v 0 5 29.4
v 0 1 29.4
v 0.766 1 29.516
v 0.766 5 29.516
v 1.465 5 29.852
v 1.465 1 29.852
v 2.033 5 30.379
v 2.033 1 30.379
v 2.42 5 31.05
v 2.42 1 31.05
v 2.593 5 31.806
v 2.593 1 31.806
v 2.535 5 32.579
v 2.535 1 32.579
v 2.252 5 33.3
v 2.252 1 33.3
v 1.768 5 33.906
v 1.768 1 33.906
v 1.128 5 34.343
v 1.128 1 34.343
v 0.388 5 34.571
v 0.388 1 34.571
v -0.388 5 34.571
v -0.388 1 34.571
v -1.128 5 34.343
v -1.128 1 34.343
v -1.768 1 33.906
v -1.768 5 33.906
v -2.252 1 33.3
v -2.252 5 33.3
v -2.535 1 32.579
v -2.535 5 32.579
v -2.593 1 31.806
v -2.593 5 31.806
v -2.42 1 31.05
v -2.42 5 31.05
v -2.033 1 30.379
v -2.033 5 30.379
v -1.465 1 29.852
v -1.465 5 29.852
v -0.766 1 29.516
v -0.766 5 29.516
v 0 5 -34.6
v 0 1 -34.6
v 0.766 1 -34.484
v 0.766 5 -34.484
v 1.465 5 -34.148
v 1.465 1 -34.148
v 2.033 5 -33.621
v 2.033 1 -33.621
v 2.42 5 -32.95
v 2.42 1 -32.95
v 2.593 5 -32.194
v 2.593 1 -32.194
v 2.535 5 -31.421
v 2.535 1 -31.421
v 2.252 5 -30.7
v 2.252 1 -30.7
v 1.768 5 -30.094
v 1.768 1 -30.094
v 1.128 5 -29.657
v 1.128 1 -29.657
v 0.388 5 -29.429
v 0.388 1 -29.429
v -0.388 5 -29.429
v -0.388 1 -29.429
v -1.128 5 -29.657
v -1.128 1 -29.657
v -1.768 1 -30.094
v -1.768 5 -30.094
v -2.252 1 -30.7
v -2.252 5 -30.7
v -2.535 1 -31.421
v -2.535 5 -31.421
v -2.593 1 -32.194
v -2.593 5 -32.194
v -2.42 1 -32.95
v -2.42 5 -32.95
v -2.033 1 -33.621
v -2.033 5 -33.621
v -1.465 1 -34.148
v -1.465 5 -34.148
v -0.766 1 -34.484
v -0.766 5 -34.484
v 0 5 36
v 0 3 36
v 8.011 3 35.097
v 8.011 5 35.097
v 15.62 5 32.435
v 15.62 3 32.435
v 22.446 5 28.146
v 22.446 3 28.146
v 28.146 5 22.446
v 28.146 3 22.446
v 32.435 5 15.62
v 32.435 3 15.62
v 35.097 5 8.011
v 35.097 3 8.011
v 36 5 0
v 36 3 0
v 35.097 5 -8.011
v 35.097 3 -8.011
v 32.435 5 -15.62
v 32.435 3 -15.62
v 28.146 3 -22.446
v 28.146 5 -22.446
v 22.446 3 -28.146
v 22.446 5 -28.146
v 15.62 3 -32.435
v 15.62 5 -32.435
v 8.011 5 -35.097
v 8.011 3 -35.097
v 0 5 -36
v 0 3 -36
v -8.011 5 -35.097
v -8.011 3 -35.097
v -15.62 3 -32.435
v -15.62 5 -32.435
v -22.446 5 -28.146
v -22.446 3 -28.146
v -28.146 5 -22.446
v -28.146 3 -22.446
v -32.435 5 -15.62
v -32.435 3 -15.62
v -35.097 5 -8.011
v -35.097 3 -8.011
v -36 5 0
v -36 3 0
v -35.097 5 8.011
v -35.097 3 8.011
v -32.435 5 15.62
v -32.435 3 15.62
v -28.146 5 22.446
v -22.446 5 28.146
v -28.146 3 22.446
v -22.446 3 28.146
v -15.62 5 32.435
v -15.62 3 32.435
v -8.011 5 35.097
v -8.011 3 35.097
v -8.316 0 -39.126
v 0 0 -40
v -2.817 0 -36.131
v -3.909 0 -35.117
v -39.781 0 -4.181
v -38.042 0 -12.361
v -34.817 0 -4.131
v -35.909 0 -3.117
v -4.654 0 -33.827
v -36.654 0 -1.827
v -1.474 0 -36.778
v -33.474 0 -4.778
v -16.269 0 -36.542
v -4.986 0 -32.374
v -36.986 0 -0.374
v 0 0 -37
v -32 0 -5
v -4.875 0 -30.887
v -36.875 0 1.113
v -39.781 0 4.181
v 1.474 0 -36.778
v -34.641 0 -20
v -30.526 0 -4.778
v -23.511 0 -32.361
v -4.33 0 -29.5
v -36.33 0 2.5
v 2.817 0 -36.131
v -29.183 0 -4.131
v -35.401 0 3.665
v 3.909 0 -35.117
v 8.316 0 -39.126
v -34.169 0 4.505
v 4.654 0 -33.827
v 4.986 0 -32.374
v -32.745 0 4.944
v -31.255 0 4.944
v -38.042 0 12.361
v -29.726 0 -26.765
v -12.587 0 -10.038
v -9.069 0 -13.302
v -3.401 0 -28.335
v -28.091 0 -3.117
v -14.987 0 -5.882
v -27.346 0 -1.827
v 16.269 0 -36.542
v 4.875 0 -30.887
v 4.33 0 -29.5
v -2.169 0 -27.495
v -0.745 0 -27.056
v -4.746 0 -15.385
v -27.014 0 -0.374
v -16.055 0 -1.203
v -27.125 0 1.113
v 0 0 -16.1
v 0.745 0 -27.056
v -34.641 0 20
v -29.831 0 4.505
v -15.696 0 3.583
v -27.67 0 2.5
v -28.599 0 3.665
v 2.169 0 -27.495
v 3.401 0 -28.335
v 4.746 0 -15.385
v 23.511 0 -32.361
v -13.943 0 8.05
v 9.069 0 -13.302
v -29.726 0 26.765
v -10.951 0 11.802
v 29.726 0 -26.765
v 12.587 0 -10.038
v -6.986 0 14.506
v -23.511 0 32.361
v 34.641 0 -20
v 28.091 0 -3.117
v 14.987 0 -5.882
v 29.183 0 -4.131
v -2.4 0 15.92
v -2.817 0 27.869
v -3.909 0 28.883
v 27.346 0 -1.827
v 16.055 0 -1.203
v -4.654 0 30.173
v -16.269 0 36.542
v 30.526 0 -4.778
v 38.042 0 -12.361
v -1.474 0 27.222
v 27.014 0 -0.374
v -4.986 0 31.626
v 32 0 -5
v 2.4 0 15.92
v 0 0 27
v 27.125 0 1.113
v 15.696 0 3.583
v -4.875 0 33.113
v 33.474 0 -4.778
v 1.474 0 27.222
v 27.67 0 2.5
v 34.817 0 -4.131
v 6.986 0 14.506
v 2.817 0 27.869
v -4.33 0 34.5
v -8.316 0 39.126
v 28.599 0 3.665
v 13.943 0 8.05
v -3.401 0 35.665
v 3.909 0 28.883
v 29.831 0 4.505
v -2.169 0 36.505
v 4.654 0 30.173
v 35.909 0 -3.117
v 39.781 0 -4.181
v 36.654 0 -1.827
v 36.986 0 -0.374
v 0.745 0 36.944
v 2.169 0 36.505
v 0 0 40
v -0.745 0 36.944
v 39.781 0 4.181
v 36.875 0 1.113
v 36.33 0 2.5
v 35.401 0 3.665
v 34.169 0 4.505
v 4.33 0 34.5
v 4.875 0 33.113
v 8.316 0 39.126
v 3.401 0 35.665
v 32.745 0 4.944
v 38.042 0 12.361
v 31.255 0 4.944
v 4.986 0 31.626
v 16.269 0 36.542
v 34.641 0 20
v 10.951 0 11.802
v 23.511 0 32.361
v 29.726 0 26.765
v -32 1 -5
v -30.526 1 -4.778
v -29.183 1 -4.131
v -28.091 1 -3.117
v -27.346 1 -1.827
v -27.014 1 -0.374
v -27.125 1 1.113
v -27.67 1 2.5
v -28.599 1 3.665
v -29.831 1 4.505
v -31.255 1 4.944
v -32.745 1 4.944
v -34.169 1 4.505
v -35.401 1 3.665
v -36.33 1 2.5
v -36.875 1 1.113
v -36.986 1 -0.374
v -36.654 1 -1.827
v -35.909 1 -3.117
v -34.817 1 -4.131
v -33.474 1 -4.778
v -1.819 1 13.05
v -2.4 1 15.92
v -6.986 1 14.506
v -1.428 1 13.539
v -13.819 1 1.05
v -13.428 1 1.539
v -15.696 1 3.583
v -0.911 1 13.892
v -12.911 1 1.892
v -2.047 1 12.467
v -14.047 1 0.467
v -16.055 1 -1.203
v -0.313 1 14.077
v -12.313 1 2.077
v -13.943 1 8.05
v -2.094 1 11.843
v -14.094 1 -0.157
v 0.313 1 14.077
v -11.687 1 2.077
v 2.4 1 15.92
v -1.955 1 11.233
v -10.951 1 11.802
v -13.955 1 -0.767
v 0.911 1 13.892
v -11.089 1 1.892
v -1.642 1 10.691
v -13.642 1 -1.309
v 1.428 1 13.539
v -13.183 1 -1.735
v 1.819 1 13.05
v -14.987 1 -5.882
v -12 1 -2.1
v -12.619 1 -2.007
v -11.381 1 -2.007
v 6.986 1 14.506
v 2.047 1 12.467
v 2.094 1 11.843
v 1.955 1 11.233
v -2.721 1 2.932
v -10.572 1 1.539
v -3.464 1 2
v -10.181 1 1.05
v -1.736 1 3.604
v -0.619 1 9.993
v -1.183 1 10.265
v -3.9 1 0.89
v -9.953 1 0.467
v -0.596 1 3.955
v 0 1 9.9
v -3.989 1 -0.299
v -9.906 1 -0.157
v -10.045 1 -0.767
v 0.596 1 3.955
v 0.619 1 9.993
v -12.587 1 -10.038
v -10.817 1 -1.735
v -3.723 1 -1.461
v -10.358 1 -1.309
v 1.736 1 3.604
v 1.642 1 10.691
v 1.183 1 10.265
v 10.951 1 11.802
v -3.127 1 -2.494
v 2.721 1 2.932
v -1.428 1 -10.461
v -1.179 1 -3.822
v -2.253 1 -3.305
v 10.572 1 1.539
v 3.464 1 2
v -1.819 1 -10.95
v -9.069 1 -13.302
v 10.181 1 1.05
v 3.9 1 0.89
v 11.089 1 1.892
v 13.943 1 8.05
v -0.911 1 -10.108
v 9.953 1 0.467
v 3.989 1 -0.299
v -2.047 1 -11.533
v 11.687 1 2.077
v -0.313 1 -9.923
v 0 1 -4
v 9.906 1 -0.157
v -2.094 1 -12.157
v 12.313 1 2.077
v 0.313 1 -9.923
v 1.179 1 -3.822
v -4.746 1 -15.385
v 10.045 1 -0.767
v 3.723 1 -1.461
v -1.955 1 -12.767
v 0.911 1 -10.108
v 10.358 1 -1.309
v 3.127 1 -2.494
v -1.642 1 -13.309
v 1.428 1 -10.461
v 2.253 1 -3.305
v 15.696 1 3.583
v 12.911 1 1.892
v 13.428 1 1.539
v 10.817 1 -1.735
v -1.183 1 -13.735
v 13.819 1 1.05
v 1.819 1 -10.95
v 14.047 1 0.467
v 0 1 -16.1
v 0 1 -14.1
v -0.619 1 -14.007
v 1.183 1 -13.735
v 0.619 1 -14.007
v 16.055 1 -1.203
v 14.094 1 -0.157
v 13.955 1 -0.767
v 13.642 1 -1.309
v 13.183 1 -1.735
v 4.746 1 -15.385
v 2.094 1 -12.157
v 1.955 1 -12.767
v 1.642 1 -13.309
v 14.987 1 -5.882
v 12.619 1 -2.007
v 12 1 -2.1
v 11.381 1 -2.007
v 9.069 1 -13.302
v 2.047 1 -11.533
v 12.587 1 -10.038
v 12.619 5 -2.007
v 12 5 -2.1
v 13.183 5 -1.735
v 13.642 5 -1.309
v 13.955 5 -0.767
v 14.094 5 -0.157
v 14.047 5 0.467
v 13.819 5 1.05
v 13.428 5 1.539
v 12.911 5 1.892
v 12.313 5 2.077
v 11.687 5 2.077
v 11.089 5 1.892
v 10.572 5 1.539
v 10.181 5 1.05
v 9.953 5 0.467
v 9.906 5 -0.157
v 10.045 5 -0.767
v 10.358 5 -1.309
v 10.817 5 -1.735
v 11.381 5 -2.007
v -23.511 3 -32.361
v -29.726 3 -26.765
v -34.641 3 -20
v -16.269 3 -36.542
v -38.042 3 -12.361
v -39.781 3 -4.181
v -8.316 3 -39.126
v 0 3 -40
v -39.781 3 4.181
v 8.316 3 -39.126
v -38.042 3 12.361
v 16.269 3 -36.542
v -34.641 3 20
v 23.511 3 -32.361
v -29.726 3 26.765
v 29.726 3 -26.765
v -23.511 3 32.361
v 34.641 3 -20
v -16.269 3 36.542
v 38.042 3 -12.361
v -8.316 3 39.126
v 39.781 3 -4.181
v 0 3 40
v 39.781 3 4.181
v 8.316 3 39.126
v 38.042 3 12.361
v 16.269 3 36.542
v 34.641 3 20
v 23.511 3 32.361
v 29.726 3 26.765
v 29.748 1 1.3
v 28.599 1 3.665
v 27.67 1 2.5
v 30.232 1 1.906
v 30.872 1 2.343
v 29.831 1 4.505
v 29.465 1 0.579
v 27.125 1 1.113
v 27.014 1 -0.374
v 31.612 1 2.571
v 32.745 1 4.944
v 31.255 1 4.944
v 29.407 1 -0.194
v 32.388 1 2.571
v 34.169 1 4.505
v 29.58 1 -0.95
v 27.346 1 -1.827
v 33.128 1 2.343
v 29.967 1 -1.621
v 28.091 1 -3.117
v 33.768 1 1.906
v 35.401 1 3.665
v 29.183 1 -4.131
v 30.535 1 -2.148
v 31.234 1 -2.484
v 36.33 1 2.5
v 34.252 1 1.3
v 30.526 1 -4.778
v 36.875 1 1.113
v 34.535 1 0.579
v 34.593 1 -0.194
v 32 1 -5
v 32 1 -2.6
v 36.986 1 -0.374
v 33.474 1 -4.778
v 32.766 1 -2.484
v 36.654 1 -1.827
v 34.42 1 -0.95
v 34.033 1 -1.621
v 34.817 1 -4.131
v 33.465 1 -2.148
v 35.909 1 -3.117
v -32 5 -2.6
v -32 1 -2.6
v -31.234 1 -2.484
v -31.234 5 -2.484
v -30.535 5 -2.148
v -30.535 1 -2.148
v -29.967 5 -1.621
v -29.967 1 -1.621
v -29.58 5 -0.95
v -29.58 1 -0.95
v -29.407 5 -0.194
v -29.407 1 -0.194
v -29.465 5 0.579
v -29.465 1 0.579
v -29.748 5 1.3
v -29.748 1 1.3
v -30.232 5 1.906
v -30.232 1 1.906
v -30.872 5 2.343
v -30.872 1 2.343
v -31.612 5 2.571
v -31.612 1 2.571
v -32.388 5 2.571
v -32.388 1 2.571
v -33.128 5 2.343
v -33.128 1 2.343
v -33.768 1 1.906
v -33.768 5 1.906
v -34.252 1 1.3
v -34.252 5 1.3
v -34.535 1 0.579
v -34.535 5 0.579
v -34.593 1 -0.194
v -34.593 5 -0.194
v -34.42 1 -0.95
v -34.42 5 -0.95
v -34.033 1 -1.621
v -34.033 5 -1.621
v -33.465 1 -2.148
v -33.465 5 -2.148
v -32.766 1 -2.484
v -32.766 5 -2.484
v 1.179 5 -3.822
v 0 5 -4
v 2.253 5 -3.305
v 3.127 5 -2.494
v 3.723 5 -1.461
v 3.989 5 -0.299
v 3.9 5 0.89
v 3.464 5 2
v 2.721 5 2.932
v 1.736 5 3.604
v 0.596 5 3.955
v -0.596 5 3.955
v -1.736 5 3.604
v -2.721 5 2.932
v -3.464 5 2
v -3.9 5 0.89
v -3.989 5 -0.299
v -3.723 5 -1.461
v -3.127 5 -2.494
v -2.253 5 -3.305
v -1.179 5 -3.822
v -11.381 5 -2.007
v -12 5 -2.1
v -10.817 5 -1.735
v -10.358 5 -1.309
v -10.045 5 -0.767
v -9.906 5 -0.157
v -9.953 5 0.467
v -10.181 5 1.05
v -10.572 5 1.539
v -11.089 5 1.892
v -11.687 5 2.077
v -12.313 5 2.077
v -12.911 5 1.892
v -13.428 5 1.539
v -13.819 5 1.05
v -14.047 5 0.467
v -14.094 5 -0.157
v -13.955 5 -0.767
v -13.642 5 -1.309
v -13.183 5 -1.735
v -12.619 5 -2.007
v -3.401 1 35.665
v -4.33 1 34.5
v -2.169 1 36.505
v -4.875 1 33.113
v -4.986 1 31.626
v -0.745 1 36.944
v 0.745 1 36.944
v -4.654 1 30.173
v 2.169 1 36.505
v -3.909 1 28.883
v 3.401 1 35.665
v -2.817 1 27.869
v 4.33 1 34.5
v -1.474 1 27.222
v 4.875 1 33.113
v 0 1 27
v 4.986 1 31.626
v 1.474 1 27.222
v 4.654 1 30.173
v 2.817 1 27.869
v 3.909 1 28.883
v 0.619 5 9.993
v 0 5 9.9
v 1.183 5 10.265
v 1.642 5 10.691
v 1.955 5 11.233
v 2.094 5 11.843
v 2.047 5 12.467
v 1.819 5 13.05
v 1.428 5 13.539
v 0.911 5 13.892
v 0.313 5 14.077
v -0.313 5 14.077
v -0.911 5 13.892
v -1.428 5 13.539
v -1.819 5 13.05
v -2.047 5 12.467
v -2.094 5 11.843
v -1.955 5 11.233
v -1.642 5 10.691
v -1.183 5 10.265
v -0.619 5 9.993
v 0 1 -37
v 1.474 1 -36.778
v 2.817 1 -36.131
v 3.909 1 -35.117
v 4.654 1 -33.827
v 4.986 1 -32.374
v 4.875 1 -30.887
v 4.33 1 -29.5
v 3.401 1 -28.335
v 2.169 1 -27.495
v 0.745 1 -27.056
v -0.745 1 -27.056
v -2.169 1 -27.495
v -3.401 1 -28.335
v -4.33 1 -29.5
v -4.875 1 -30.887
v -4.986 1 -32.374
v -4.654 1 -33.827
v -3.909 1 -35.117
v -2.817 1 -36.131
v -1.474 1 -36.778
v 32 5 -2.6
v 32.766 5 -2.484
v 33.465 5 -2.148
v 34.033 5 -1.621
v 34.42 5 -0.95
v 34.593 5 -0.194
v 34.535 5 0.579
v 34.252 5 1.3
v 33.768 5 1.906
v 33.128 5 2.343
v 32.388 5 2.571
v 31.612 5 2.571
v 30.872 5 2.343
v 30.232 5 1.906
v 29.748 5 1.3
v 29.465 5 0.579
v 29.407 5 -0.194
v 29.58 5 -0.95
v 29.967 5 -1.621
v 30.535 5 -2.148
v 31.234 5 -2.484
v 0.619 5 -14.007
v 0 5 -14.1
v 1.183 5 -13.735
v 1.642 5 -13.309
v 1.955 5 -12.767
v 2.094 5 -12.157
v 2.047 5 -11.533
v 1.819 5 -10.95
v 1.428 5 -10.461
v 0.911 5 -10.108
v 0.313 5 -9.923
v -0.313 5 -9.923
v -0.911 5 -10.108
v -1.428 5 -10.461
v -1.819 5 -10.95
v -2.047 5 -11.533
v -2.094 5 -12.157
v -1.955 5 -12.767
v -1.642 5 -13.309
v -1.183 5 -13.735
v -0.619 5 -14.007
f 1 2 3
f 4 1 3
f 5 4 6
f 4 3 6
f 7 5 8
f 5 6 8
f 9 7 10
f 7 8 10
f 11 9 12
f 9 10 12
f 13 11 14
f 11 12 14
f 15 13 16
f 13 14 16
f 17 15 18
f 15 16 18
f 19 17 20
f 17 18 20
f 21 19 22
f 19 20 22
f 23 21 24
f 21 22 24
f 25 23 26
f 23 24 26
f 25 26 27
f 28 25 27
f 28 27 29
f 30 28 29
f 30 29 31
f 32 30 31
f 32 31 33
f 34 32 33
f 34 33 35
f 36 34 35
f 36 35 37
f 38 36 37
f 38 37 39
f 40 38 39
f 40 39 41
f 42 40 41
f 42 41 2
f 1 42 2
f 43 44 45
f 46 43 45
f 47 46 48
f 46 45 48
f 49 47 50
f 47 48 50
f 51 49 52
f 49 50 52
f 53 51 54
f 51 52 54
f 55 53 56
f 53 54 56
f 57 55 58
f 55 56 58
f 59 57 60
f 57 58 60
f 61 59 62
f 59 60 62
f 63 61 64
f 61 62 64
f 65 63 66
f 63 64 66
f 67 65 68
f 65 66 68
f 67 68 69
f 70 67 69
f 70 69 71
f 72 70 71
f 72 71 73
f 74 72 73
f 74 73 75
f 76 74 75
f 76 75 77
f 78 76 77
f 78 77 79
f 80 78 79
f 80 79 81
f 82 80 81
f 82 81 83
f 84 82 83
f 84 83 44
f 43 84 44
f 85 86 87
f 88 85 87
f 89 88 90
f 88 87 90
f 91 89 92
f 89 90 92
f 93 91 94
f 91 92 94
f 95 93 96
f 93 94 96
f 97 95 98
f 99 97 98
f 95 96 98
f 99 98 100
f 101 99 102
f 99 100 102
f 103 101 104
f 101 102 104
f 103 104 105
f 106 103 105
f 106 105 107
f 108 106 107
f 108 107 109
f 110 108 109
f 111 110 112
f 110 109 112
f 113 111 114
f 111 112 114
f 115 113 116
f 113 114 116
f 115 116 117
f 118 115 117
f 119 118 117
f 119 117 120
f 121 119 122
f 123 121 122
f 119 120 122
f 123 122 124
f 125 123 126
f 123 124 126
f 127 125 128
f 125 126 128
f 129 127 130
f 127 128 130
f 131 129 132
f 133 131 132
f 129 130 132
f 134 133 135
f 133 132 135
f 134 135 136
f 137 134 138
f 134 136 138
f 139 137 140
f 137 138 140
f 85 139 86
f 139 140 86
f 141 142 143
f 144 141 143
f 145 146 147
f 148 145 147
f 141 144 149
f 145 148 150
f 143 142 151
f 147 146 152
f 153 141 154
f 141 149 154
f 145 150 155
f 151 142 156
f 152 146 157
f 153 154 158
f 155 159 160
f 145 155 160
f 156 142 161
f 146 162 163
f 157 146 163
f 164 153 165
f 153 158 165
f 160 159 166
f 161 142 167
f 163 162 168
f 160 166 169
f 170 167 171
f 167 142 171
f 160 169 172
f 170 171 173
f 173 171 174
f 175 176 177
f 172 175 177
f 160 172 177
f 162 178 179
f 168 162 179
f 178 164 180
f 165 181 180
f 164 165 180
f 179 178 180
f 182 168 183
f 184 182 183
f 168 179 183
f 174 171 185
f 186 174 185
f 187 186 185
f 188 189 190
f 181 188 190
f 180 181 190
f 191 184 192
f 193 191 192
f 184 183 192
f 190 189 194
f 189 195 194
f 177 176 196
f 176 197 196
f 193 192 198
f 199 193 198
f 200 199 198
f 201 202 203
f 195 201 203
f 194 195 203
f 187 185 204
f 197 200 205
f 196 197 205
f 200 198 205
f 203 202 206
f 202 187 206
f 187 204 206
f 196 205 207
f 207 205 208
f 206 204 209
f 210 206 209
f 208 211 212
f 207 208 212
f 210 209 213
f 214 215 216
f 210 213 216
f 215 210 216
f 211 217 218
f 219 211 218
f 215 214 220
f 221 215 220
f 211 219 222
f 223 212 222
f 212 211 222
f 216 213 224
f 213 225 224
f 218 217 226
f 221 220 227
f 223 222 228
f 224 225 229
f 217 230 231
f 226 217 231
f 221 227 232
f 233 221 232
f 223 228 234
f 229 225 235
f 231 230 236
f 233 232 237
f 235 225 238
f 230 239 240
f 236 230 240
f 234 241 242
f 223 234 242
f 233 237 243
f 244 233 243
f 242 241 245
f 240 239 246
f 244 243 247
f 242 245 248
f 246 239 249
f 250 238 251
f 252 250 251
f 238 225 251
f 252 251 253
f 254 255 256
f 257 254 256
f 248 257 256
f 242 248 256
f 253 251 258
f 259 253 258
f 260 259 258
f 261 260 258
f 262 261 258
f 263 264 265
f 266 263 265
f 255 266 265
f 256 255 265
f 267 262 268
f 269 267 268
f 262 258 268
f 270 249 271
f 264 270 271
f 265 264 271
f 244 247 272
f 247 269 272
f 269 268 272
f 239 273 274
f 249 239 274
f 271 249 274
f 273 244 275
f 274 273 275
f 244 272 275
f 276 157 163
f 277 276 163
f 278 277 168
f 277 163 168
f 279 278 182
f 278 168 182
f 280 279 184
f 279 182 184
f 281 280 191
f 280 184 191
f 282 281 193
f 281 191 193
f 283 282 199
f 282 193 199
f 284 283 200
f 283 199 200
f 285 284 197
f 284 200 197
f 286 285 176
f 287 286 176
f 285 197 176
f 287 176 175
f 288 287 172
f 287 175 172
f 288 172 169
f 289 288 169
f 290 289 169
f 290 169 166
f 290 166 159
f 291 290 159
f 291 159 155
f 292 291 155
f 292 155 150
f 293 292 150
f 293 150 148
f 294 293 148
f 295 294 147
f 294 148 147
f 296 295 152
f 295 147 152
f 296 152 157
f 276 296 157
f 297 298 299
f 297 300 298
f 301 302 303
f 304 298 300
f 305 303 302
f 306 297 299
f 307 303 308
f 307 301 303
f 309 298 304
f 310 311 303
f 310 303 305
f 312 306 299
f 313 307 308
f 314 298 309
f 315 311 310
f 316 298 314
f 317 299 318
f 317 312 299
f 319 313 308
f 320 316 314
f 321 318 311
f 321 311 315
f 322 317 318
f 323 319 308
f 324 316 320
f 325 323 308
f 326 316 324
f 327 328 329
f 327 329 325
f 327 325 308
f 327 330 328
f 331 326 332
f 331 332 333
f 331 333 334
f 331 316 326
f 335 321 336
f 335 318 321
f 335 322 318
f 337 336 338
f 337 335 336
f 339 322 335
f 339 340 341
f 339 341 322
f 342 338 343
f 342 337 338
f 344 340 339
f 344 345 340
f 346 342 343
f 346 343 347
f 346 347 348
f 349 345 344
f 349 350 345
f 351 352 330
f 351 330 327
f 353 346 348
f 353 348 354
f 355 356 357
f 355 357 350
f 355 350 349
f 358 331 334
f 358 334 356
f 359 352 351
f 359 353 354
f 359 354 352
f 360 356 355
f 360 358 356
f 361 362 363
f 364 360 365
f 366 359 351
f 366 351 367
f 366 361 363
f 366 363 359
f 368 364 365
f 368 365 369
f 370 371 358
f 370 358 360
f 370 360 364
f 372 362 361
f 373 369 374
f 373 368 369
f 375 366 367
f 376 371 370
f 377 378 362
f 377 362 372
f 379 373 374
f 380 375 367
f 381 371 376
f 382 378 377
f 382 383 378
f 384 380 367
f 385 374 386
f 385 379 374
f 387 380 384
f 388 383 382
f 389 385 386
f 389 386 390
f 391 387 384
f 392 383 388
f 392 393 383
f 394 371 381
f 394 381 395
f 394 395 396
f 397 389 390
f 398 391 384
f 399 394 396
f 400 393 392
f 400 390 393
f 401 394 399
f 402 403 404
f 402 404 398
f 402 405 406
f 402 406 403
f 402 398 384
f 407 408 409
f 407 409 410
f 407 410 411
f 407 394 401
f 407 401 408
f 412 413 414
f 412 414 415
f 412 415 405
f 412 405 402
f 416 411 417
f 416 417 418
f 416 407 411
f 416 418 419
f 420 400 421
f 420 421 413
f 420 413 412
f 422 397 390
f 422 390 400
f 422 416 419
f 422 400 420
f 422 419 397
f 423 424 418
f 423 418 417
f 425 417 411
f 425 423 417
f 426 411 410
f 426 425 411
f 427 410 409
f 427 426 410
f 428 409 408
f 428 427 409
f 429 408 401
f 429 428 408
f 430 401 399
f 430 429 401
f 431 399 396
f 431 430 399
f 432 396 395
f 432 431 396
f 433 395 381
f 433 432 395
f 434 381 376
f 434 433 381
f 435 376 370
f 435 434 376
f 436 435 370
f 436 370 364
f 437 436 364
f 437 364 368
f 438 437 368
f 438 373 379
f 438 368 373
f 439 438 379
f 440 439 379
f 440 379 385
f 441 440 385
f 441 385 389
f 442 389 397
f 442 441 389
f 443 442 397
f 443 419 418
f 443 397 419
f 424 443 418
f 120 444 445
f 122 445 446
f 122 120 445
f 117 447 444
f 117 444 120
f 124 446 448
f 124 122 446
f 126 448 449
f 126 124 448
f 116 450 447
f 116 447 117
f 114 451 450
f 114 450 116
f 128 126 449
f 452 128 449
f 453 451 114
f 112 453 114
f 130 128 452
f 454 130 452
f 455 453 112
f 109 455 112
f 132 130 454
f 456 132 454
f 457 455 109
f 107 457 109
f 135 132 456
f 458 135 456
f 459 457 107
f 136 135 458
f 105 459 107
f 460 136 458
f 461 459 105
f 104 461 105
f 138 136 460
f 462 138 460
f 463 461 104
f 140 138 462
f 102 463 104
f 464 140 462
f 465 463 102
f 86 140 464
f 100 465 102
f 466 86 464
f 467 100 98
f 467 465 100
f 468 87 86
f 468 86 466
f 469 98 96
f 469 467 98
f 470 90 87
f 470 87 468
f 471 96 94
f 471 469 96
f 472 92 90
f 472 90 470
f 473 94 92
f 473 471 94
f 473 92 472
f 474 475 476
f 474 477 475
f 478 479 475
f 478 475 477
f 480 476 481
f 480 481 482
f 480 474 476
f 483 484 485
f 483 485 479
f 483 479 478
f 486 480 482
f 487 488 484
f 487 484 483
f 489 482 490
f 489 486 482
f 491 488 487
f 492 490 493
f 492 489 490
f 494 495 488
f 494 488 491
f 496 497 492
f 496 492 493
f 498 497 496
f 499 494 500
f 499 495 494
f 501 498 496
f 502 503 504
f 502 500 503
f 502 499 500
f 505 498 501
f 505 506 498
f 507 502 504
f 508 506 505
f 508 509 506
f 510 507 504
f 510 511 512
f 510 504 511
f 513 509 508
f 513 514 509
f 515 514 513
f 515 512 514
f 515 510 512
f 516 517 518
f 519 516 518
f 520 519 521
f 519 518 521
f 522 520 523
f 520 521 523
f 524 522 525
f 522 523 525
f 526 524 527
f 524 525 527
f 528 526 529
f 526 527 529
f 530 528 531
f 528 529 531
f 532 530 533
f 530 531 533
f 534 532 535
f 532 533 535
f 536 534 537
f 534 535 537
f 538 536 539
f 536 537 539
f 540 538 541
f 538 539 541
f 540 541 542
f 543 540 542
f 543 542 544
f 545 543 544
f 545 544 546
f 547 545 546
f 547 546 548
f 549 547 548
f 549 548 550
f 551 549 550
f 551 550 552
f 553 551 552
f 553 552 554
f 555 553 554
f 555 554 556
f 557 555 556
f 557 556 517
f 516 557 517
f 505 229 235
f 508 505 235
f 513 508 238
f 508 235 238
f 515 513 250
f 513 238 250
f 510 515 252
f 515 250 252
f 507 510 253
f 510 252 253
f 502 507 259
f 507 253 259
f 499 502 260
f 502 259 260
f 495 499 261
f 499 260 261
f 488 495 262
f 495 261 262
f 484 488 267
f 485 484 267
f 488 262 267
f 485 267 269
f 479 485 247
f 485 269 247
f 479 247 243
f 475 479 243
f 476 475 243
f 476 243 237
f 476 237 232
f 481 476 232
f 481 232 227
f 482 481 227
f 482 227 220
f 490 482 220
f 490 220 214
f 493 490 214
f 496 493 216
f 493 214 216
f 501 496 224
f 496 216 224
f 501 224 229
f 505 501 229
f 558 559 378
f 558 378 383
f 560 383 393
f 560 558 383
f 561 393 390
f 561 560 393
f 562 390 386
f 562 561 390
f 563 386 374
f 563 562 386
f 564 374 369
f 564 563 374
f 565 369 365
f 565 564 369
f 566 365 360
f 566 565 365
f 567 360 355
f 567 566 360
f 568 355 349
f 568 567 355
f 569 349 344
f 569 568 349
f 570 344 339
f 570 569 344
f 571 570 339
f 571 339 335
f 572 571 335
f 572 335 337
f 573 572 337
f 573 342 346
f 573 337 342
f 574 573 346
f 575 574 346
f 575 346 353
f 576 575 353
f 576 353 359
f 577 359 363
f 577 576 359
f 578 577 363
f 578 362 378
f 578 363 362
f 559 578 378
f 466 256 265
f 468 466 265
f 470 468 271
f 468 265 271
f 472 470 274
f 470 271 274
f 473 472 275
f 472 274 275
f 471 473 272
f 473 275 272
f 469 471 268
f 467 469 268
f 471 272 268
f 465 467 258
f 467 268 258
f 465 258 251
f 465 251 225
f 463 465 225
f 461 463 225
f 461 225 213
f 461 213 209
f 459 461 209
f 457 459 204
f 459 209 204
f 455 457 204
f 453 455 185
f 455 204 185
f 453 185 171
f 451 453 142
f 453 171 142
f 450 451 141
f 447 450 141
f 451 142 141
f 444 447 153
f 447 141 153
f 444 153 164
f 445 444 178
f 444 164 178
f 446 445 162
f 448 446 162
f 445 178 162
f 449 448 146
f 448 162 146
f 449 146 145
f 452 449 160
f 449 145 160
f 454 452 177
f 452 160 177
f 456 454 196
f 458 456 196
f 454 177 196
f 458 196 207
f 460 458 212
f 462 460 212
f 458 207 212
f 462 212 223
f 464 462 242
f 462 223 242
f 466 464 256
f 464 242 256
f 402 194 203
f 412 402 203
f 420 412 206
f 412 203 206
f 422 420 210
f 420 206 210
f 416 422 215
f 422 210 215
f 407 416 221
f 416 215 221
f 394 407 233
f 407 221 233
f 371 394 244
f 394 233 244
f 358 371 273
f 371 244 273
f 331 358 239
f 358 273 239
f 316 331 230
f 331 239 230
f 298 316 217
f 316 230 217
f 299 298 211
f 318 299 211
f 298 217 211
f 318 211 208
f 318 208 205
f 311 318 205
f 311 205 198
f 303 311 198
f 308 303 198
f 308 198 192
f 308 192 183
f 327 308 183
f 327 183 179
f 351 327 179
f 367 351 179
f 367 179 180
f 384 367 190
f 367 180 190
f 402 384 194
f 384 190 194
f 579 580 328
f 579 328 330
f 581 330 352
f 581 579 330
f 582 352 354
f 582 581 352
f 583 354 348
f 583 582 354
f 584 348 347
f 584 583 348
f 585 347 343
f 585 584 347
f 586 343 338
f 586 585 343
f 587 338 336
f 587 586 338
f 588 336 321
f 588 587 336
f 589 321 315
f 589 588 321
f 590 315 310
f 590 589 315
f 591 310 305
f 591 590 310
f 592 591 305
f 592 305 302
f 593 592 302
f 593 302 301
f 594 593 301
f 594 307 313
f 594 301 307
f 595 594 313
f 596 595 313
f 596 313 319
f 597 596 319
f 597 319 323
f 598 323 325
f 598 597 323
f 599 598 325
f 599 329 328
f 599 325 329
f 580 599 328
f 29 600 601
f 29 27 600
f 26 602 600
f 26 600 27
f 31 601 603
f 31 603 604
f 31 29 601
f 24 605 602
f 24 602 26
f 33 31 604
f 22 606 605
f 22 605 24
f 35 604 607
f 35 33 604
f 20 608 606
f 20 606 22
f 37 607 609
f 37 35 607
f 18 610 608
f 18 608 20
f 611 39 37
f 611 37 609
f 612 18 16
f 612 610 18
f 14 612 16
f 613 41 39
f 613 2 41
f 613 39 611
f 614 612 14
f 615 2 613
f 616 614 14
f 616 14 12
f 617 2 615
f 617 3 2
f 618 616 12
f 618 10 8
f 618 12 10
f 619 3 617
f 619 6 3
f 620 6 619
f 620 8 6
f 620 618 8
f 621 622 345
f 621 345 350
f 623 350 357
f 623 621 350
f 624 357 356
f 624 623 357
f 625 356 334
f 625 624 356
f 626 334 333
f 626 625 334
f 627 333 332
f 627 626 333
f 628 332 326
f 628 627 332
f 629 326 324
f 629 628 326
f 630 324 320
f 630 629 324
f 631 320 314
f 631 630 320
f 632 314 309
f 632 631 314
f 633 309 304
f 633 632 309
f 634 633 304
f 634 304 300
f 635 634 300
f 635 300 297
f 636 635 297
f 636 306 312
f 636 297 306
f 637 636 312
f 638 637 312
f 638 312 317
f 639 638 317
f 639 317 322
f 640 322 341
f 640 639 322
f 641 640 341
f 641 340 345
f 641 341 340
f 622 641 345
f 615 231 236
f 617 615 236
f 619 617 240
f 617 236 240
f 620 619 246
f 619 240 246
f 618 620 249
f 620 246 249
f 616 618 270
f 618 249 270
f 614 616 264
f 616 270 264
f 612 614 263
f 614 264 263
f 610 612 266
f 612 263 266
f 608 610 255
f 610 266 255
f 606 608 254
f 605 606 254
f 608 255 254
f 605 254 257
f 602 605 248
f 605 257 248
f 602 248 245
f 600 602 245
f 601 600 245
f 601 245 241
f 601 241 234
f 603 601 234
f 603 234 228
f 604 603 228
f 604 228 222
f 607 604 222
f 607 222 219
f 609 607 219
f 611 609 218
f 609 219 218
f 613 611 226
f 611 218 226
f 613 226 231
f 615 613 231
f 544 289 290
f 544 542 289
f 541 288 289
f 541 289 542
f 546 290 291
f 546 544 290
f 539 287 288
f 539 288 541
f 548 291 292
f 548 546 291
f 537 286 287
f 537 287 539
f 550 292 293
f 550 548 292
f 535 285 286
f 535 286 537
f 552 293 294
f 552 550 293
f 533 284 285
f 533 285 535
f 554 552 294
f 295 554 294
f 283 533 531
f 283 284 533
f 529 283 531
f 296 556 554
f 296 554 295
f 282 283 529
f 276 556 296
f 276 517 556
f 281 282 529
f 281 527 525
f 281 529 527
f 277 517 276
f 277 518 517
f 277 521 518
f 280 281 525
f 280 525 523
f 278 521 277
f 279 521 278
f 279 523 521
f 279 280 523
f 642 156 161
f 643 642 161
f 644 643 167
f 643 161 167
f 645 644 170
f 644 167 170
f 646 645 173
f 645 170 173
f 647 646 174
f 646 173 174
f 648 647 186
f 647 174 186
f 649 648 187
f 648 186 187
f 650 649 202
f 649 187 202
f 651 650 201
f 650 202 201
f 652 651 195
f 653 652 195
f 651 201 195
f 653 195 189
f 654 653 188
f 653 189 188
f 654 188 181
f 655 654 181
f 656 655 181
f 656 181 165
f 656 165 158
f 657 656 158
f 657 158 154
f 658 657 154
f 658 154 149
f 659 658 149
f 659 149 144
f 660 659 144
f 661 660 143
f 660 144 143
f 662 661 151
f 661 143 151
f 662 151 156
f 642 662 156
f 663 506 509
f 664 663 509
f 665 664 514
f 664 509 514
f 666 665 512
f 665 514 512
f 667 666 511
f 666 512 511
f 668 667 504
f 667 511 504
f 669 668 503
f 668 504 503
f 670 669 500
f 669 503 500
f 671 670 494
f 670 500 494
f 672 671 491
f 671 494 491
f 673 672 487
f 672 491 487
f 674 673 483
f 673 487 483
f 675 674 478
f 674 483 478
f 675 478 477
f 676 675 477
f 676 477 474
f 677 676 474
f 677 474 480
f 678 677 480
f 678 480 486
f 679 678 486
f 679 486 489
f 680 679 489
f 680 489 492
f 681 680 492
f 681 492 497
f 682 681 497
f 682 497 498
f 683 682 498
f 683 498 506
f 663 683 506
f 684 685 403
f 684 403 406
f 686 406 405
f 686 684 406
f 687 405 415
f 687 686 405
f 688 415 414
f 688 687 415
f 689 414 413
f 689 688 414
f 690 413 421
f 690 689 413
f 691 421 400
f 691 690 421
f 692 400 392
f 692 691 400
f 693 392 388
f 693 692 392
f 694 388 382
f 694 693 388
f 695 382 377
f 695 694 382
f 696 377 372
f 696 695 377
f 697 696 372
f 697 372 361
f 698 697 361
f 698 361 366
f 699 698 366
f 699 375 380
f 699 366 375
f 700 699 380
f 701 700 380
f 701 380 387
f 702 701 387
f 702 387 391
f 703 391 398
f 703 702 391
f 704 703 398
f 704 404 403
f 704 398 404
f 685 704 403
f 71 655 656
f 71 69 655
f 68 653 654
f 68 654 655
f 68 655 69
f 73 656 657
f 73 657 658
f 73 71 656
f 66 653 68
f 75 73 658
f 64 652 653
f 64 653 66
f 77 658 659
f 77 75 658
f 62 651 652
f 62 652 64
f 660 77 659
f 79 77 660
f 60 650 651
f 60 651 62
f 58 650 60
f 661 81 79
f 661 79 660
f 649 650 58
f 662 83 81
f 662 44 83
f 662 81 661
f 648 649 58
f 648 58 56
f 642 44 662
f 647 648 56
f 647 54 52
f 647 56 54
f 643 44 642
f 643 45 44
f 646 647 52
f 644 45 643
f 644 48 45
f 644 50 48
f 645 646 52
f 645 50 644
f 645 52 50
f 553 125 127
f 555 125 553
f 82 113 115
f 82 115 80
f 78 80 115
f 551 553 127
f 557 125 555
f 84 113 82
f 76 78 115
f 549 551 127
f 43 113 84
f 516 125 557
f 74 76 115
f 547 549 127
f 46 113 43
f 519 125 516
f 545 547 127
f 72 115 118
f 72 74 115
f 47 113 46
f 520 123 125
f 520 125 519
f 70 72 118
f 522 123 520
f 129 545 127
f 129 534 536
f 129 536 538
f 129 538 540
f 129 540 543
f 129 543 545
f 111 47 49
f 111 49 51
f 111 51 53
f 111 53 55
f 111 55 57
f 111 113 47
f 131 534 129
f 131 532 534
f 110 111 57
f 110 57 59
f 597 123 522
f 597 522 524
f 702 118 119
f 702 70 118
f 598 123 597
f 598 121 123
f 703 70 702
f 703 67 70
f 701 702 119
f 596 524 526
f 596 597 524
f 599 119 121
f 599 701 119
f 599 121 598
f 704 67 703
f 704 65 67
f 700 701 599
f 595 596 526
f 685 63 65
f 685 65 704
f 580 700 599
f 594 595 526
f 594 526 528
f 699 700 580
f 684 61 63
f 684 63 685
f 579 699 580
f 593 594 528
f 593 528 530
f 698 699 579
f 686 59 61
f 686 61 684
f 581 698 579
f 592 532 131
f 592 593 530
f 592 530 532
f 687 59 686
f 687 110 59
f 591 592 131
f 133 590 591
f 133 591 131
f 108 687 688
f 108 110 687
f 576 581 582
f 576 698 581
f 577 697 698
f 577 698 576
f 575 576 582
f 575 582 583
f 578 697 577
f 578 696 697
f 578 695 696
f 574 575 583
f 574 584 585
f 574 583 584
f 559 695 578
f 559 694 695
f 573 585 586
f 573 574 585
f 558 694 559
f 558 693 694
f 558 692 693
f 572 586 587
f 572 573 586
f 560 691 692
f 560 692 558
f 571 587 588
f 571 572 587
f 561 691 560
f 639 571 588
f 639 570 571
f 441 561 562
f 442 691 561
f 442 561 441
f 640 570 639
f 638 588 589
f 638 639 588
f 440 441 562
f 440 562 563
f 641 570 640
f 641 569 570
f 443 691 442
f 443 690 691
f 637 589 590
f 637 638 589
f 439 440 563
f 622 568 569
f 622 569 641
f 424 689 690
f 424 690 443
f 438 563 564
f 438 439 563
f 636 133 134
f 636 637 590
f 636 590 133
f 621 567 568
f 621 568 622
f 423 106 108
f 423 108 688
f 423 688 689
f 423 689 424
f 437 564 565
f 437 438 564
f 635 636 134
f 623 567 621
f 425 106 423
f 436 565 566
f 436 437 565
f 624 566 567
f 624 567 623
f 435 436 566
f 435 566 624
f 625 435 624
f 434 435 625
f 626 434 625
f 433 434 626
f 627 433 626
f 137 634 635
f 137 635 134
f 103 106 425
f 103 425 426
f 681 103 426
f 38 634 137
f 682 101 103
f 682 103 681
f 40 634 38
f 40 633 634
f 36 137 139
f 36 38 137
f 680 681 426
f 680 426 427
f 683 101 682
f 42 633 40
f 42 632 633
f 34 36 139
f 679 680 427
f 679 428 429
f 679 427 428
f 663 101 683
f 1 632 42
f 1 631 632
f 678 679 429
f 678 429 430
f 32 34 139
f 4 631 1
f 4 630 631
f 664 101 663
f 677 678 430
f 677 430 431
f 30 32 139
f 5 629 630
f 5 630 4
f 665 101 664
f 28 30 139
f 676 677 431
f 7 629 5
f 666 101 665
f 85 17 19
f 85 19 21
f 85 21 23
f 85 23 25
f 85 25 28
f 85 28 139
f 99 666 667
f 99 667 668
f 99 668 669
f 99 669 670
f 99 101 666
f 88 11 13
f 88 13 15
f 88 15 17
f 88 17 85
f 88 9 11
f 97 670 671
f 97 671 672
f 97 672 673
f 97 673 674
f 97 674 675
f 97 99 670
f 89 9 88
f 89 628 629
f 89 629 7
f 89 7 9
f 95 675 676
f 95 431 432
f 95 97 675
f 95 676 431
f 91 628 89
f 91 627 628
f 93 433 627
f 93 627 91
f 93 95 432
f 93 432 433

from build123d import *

# Parameters (mm, degrees)
SKETCH_1_R               = 40
EXTRUDE_1_DEPTH          = 3
SKETCH_2_R               = 36
EXTRUDE_2_DEPTH          = 2
CUT_EXTRUDE_1_DEPTH      = 57.789083458
CUT_EXTRUDE_1_DEPTH_BACK = 57.789083458
SKETCH_3_R               = 2.1
SKETCH_3_R_2             = 4
SKETCH_4_R               = 16.1
CUT_EXTRUDE_2_DEPTH      = 1
SKETCH_5_R               = 2.6
CUT_EXTRUDE_3_DEPTH      = 57.789083458
SKETCH_6_R               = 5
CUT_EXTRUDE_4_DEPTH      = 1


with BuildPart() as part:
    # 草图1 → 凸台-拉伸1 (new body)
    with BuildSketch(Plane(origin=(0, 0, 0), x_dir=(1, 0, 0), z_dir=(0, 1, 0))):
        with Locations(Location((0, 0, 0), (0, 0, 270))):
            Circle(SKETCH_1_R)
    extrude(amount=EXTRUDE_1_DEPTH)

    # 草图2 → 凸台-拉伸2 (add)
    with BuildSketch(Plane(origin=(0, 3, 0), x_dir=(1, 0, 0), z_dir=(0, 1, 0))):
        with Locations(Location((0, 0, 0), (0, 0, 270))):
            Circle(SKETCH_2_R)
    extrude(amount=EXTRUDE_2_DEPTH)

    # 草图3 → 切除-拉伸1 (cut, two sides: drawn at the far end of the back side and taken through both)
    with BuildSketch(Plane.XZ.offset(-CUT_EXTRUDE_1_DEPTH_BACK)):
        with Locations(Location((-12, 0, 0), (0, 0, 270))):
            Circle(SKETCH_3_R)
        with Locations(Location((0, 12, 0), (0, 0, 270))):
            Circle(SKETCH_3_R)
        with Locations(Location((12, 0, 0), (0, 0, 270))):
            Circle(SKETCH_3_R)
        with Locations(Location((0, -12, 0), (0, 0, 270))):
            Circle(SKETCH_3_R)
        with Locations(Location((0, 0, 0), (0, 0, 270))):
            Circle(SKETCH_3_R_2)
    extrude(amount=CUT_EXTRUDE_1_DEPTH + CUT_EXTRUDE_1_DEPTH_BACK, mode=Mode.SUBTRACT)

    # 草图4 → 切除-拉伸2 (cut)
    with BuildSketch(Plane.XZ):
        with Locations(Location((0, 0, 0), (0, 0, 270))):
            Circle(SKETCH_4_R)
    extrude(amount=-CUT_EXTRUDE_2_DEPTH, mode=Mode.SUBTRACT)

    # 草图5 → 切除-拉伸3 (cut, through all)
    with BuildSketch(Plane.XZ):
        with Locations(Location((-32, 0, 0), (0, 0, 270))):
            Circle(SKETCH_5_R)
        with Locations(Location((0, 32, 0), (0, 0, 270))):
            Circle(SKETCH_5_R)
        with Locations(Location((32, 0, 0), (0, 0, 270))):
            Circle(SKETCH_5_R)
        with Locations(Location((0, -32, 0), (0, 0, 270))):
            Circle(SKETCH_5_R)
    extrude(amount=-CUT_EXTRUDE_3_DEPTH, mode=Mode.SUBTRACT)

    # 草图6 → 切除-拉伸4 (cut)
    with BuildSketch(Plane.XZ):
        with Locations(Location((0, -32, 0), (0, 0, 270))):
            Circle(SKETCH_6_R)
        with Locations(Location((32, 0, 0), (0, 0, 270))):
            Circle(SKETCH_6_R)
        with Locations(Location((0, 32, 0), (0, 0, 270))):
            Circle(SKETCH_6_R)
        with Locations(Location((-32, 0, 0), (0, 0, 270))):
            Circle(SKETCH_6_R)
    extrude(amount=-CUT_EXTRUDE_4_DEPTH, mode=Mode.SUBTRACT)


solid = part.part
